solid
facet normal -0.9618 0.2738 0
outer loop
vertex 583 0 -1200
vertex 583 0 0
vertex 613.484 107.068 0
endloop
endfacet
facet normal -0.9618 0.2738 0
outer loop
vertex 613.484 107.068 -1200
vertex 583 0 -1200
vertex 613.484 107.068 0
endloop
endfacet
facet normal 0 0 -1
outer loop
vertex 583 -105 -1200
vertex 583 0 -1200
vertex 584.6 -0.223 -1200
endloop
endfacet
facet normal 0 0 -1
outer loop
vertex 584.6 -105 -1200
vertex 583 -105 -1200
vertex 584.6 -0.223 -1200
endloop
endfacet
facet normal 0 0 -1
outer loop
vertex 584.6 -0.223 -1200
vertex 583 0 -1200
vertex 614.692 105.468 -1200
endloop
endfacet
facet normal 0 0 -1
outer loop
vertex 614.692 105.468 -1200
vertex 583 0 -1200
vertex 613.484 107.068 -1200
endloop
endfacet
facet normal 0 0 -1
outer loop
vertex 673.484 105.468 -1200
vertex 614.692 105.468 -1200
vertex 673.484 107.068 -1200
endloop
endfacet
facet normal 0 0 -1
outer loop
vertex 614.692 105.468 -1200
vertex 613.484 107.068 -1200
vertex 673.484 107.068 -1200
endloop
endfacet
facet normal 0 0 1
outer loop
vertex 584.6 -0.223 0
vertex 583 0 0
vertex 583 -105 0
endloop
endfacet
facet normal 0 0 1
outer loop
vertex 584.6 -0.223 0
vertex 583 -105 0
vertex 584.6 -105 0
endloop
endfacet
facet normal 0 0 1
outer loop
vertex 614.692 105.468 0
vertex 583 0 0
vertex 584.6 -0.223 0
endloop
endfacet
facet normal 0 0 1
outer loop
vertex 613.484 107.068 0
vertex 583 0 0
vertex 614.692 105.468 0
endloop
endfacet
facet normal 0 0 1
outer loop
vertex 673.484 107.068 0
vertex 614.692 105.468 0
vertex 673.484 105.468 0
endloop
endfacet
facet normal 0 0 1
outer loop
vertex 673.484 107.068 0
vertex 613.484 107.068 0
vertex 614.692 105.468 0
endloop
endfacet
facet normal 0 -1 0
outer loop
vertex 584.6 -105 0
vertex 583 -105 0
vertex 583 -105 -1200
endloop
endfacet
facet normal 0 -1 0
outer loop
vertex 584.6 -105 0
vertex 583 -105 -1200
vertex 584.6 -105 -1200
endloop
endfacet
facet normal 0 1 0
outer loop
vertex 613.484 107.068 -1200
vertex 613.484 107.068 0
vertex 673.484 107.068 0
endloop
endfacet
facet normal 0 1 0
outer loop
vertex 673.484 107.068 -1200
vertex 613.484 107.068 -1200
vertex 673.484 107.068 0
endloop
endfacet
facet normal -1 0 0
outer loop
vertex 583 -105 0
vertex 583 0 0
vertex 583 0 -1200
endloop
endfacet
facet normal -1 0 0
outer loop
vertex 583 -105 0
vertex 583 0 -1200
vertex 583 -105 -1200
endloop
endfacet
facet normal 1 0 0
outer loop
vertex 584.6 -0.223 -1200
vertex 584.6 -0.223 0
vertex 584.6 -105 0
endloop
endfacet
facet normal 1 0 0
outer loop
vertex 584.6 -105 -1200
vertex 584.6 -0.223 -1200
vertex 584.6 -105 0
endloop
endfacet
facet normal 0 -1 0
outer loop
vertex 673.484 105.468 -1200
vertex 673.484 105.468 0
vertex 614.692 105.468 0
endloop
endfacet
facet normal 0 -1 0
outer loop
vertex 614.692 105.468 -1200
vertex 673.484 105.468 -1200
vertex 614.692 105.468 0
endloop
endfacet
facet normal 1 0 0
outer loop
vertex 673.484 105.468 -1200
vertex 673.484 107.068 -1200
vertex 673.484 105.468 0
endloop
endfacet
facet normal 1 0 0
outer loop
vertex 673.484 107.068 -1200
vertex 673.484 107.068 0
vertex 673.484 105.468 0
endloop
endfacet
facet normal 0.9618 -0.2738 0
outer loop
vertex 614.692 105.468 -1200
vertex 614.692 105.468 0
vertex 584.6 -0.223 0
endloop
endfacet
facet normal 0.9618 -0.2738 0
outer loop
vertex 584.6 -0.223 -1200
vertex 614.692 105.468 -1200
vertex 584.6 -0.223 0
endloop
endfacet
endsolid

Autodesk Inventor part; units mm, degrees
ref_plane "YZ Plane" through (0, 0, 0) normal (1, 0, 0) x (0, 1, 0)
ref_plane "XZ Plane" through (0, 0, 0) normal (0, 1, 0) x (-1, 0, 0)
ref_plane "XY Plane" through (0, 0, 0) normal (0, 0, 1) x (1, 0, 0)
sketch "Sketch1" plane through (0, 0, 0) normal (0, 0, 1) x (1, 0, 0)
  line L0 (583, 0) -> (583, -566) projected
  line L1 (613.4835, 107.0681) -> (1060.6433, 107.0681) projected
  point P0 (0, 0)
sketch "Sketch2" plane through (0, 0, 0) normal (0, 0, 1) x (1, 0, 0)
  line L0 (583, 0) -> (613.4835, 107.0681)
  line L1 (613.4835, 107.0681) -> (673.4835, 107.0681)
  line L2 (583, 0) -> (583, -105)
  line L3 (673.4835, 105.4681) -> (614.6916, 105.4681)
  line L4 (614.6916, 105.4681) -> (584.6, -0.2233)
  line L5 (584.6, -0.2233) -> (584.6, -105)
  line L6 (583, -105) -> (584.6, -105)
  line L7 (673.4835, 107.0681) -> (673.4835, 105.4681)
  point P0 (0, 0)
  dimension "d0" = 105
  dimension "d1" = 60
  dimension "d2" = 1.6
extrude "Extrusion1" add sketch "Sketch2" against normal blind 1200
sketch "Sketch3" plane through (583, -105, -1200) normal (0, -1, 0) x (1, 0, 0)
  point P0 (-583, 1200)
properties part number "front" material "Steel"
